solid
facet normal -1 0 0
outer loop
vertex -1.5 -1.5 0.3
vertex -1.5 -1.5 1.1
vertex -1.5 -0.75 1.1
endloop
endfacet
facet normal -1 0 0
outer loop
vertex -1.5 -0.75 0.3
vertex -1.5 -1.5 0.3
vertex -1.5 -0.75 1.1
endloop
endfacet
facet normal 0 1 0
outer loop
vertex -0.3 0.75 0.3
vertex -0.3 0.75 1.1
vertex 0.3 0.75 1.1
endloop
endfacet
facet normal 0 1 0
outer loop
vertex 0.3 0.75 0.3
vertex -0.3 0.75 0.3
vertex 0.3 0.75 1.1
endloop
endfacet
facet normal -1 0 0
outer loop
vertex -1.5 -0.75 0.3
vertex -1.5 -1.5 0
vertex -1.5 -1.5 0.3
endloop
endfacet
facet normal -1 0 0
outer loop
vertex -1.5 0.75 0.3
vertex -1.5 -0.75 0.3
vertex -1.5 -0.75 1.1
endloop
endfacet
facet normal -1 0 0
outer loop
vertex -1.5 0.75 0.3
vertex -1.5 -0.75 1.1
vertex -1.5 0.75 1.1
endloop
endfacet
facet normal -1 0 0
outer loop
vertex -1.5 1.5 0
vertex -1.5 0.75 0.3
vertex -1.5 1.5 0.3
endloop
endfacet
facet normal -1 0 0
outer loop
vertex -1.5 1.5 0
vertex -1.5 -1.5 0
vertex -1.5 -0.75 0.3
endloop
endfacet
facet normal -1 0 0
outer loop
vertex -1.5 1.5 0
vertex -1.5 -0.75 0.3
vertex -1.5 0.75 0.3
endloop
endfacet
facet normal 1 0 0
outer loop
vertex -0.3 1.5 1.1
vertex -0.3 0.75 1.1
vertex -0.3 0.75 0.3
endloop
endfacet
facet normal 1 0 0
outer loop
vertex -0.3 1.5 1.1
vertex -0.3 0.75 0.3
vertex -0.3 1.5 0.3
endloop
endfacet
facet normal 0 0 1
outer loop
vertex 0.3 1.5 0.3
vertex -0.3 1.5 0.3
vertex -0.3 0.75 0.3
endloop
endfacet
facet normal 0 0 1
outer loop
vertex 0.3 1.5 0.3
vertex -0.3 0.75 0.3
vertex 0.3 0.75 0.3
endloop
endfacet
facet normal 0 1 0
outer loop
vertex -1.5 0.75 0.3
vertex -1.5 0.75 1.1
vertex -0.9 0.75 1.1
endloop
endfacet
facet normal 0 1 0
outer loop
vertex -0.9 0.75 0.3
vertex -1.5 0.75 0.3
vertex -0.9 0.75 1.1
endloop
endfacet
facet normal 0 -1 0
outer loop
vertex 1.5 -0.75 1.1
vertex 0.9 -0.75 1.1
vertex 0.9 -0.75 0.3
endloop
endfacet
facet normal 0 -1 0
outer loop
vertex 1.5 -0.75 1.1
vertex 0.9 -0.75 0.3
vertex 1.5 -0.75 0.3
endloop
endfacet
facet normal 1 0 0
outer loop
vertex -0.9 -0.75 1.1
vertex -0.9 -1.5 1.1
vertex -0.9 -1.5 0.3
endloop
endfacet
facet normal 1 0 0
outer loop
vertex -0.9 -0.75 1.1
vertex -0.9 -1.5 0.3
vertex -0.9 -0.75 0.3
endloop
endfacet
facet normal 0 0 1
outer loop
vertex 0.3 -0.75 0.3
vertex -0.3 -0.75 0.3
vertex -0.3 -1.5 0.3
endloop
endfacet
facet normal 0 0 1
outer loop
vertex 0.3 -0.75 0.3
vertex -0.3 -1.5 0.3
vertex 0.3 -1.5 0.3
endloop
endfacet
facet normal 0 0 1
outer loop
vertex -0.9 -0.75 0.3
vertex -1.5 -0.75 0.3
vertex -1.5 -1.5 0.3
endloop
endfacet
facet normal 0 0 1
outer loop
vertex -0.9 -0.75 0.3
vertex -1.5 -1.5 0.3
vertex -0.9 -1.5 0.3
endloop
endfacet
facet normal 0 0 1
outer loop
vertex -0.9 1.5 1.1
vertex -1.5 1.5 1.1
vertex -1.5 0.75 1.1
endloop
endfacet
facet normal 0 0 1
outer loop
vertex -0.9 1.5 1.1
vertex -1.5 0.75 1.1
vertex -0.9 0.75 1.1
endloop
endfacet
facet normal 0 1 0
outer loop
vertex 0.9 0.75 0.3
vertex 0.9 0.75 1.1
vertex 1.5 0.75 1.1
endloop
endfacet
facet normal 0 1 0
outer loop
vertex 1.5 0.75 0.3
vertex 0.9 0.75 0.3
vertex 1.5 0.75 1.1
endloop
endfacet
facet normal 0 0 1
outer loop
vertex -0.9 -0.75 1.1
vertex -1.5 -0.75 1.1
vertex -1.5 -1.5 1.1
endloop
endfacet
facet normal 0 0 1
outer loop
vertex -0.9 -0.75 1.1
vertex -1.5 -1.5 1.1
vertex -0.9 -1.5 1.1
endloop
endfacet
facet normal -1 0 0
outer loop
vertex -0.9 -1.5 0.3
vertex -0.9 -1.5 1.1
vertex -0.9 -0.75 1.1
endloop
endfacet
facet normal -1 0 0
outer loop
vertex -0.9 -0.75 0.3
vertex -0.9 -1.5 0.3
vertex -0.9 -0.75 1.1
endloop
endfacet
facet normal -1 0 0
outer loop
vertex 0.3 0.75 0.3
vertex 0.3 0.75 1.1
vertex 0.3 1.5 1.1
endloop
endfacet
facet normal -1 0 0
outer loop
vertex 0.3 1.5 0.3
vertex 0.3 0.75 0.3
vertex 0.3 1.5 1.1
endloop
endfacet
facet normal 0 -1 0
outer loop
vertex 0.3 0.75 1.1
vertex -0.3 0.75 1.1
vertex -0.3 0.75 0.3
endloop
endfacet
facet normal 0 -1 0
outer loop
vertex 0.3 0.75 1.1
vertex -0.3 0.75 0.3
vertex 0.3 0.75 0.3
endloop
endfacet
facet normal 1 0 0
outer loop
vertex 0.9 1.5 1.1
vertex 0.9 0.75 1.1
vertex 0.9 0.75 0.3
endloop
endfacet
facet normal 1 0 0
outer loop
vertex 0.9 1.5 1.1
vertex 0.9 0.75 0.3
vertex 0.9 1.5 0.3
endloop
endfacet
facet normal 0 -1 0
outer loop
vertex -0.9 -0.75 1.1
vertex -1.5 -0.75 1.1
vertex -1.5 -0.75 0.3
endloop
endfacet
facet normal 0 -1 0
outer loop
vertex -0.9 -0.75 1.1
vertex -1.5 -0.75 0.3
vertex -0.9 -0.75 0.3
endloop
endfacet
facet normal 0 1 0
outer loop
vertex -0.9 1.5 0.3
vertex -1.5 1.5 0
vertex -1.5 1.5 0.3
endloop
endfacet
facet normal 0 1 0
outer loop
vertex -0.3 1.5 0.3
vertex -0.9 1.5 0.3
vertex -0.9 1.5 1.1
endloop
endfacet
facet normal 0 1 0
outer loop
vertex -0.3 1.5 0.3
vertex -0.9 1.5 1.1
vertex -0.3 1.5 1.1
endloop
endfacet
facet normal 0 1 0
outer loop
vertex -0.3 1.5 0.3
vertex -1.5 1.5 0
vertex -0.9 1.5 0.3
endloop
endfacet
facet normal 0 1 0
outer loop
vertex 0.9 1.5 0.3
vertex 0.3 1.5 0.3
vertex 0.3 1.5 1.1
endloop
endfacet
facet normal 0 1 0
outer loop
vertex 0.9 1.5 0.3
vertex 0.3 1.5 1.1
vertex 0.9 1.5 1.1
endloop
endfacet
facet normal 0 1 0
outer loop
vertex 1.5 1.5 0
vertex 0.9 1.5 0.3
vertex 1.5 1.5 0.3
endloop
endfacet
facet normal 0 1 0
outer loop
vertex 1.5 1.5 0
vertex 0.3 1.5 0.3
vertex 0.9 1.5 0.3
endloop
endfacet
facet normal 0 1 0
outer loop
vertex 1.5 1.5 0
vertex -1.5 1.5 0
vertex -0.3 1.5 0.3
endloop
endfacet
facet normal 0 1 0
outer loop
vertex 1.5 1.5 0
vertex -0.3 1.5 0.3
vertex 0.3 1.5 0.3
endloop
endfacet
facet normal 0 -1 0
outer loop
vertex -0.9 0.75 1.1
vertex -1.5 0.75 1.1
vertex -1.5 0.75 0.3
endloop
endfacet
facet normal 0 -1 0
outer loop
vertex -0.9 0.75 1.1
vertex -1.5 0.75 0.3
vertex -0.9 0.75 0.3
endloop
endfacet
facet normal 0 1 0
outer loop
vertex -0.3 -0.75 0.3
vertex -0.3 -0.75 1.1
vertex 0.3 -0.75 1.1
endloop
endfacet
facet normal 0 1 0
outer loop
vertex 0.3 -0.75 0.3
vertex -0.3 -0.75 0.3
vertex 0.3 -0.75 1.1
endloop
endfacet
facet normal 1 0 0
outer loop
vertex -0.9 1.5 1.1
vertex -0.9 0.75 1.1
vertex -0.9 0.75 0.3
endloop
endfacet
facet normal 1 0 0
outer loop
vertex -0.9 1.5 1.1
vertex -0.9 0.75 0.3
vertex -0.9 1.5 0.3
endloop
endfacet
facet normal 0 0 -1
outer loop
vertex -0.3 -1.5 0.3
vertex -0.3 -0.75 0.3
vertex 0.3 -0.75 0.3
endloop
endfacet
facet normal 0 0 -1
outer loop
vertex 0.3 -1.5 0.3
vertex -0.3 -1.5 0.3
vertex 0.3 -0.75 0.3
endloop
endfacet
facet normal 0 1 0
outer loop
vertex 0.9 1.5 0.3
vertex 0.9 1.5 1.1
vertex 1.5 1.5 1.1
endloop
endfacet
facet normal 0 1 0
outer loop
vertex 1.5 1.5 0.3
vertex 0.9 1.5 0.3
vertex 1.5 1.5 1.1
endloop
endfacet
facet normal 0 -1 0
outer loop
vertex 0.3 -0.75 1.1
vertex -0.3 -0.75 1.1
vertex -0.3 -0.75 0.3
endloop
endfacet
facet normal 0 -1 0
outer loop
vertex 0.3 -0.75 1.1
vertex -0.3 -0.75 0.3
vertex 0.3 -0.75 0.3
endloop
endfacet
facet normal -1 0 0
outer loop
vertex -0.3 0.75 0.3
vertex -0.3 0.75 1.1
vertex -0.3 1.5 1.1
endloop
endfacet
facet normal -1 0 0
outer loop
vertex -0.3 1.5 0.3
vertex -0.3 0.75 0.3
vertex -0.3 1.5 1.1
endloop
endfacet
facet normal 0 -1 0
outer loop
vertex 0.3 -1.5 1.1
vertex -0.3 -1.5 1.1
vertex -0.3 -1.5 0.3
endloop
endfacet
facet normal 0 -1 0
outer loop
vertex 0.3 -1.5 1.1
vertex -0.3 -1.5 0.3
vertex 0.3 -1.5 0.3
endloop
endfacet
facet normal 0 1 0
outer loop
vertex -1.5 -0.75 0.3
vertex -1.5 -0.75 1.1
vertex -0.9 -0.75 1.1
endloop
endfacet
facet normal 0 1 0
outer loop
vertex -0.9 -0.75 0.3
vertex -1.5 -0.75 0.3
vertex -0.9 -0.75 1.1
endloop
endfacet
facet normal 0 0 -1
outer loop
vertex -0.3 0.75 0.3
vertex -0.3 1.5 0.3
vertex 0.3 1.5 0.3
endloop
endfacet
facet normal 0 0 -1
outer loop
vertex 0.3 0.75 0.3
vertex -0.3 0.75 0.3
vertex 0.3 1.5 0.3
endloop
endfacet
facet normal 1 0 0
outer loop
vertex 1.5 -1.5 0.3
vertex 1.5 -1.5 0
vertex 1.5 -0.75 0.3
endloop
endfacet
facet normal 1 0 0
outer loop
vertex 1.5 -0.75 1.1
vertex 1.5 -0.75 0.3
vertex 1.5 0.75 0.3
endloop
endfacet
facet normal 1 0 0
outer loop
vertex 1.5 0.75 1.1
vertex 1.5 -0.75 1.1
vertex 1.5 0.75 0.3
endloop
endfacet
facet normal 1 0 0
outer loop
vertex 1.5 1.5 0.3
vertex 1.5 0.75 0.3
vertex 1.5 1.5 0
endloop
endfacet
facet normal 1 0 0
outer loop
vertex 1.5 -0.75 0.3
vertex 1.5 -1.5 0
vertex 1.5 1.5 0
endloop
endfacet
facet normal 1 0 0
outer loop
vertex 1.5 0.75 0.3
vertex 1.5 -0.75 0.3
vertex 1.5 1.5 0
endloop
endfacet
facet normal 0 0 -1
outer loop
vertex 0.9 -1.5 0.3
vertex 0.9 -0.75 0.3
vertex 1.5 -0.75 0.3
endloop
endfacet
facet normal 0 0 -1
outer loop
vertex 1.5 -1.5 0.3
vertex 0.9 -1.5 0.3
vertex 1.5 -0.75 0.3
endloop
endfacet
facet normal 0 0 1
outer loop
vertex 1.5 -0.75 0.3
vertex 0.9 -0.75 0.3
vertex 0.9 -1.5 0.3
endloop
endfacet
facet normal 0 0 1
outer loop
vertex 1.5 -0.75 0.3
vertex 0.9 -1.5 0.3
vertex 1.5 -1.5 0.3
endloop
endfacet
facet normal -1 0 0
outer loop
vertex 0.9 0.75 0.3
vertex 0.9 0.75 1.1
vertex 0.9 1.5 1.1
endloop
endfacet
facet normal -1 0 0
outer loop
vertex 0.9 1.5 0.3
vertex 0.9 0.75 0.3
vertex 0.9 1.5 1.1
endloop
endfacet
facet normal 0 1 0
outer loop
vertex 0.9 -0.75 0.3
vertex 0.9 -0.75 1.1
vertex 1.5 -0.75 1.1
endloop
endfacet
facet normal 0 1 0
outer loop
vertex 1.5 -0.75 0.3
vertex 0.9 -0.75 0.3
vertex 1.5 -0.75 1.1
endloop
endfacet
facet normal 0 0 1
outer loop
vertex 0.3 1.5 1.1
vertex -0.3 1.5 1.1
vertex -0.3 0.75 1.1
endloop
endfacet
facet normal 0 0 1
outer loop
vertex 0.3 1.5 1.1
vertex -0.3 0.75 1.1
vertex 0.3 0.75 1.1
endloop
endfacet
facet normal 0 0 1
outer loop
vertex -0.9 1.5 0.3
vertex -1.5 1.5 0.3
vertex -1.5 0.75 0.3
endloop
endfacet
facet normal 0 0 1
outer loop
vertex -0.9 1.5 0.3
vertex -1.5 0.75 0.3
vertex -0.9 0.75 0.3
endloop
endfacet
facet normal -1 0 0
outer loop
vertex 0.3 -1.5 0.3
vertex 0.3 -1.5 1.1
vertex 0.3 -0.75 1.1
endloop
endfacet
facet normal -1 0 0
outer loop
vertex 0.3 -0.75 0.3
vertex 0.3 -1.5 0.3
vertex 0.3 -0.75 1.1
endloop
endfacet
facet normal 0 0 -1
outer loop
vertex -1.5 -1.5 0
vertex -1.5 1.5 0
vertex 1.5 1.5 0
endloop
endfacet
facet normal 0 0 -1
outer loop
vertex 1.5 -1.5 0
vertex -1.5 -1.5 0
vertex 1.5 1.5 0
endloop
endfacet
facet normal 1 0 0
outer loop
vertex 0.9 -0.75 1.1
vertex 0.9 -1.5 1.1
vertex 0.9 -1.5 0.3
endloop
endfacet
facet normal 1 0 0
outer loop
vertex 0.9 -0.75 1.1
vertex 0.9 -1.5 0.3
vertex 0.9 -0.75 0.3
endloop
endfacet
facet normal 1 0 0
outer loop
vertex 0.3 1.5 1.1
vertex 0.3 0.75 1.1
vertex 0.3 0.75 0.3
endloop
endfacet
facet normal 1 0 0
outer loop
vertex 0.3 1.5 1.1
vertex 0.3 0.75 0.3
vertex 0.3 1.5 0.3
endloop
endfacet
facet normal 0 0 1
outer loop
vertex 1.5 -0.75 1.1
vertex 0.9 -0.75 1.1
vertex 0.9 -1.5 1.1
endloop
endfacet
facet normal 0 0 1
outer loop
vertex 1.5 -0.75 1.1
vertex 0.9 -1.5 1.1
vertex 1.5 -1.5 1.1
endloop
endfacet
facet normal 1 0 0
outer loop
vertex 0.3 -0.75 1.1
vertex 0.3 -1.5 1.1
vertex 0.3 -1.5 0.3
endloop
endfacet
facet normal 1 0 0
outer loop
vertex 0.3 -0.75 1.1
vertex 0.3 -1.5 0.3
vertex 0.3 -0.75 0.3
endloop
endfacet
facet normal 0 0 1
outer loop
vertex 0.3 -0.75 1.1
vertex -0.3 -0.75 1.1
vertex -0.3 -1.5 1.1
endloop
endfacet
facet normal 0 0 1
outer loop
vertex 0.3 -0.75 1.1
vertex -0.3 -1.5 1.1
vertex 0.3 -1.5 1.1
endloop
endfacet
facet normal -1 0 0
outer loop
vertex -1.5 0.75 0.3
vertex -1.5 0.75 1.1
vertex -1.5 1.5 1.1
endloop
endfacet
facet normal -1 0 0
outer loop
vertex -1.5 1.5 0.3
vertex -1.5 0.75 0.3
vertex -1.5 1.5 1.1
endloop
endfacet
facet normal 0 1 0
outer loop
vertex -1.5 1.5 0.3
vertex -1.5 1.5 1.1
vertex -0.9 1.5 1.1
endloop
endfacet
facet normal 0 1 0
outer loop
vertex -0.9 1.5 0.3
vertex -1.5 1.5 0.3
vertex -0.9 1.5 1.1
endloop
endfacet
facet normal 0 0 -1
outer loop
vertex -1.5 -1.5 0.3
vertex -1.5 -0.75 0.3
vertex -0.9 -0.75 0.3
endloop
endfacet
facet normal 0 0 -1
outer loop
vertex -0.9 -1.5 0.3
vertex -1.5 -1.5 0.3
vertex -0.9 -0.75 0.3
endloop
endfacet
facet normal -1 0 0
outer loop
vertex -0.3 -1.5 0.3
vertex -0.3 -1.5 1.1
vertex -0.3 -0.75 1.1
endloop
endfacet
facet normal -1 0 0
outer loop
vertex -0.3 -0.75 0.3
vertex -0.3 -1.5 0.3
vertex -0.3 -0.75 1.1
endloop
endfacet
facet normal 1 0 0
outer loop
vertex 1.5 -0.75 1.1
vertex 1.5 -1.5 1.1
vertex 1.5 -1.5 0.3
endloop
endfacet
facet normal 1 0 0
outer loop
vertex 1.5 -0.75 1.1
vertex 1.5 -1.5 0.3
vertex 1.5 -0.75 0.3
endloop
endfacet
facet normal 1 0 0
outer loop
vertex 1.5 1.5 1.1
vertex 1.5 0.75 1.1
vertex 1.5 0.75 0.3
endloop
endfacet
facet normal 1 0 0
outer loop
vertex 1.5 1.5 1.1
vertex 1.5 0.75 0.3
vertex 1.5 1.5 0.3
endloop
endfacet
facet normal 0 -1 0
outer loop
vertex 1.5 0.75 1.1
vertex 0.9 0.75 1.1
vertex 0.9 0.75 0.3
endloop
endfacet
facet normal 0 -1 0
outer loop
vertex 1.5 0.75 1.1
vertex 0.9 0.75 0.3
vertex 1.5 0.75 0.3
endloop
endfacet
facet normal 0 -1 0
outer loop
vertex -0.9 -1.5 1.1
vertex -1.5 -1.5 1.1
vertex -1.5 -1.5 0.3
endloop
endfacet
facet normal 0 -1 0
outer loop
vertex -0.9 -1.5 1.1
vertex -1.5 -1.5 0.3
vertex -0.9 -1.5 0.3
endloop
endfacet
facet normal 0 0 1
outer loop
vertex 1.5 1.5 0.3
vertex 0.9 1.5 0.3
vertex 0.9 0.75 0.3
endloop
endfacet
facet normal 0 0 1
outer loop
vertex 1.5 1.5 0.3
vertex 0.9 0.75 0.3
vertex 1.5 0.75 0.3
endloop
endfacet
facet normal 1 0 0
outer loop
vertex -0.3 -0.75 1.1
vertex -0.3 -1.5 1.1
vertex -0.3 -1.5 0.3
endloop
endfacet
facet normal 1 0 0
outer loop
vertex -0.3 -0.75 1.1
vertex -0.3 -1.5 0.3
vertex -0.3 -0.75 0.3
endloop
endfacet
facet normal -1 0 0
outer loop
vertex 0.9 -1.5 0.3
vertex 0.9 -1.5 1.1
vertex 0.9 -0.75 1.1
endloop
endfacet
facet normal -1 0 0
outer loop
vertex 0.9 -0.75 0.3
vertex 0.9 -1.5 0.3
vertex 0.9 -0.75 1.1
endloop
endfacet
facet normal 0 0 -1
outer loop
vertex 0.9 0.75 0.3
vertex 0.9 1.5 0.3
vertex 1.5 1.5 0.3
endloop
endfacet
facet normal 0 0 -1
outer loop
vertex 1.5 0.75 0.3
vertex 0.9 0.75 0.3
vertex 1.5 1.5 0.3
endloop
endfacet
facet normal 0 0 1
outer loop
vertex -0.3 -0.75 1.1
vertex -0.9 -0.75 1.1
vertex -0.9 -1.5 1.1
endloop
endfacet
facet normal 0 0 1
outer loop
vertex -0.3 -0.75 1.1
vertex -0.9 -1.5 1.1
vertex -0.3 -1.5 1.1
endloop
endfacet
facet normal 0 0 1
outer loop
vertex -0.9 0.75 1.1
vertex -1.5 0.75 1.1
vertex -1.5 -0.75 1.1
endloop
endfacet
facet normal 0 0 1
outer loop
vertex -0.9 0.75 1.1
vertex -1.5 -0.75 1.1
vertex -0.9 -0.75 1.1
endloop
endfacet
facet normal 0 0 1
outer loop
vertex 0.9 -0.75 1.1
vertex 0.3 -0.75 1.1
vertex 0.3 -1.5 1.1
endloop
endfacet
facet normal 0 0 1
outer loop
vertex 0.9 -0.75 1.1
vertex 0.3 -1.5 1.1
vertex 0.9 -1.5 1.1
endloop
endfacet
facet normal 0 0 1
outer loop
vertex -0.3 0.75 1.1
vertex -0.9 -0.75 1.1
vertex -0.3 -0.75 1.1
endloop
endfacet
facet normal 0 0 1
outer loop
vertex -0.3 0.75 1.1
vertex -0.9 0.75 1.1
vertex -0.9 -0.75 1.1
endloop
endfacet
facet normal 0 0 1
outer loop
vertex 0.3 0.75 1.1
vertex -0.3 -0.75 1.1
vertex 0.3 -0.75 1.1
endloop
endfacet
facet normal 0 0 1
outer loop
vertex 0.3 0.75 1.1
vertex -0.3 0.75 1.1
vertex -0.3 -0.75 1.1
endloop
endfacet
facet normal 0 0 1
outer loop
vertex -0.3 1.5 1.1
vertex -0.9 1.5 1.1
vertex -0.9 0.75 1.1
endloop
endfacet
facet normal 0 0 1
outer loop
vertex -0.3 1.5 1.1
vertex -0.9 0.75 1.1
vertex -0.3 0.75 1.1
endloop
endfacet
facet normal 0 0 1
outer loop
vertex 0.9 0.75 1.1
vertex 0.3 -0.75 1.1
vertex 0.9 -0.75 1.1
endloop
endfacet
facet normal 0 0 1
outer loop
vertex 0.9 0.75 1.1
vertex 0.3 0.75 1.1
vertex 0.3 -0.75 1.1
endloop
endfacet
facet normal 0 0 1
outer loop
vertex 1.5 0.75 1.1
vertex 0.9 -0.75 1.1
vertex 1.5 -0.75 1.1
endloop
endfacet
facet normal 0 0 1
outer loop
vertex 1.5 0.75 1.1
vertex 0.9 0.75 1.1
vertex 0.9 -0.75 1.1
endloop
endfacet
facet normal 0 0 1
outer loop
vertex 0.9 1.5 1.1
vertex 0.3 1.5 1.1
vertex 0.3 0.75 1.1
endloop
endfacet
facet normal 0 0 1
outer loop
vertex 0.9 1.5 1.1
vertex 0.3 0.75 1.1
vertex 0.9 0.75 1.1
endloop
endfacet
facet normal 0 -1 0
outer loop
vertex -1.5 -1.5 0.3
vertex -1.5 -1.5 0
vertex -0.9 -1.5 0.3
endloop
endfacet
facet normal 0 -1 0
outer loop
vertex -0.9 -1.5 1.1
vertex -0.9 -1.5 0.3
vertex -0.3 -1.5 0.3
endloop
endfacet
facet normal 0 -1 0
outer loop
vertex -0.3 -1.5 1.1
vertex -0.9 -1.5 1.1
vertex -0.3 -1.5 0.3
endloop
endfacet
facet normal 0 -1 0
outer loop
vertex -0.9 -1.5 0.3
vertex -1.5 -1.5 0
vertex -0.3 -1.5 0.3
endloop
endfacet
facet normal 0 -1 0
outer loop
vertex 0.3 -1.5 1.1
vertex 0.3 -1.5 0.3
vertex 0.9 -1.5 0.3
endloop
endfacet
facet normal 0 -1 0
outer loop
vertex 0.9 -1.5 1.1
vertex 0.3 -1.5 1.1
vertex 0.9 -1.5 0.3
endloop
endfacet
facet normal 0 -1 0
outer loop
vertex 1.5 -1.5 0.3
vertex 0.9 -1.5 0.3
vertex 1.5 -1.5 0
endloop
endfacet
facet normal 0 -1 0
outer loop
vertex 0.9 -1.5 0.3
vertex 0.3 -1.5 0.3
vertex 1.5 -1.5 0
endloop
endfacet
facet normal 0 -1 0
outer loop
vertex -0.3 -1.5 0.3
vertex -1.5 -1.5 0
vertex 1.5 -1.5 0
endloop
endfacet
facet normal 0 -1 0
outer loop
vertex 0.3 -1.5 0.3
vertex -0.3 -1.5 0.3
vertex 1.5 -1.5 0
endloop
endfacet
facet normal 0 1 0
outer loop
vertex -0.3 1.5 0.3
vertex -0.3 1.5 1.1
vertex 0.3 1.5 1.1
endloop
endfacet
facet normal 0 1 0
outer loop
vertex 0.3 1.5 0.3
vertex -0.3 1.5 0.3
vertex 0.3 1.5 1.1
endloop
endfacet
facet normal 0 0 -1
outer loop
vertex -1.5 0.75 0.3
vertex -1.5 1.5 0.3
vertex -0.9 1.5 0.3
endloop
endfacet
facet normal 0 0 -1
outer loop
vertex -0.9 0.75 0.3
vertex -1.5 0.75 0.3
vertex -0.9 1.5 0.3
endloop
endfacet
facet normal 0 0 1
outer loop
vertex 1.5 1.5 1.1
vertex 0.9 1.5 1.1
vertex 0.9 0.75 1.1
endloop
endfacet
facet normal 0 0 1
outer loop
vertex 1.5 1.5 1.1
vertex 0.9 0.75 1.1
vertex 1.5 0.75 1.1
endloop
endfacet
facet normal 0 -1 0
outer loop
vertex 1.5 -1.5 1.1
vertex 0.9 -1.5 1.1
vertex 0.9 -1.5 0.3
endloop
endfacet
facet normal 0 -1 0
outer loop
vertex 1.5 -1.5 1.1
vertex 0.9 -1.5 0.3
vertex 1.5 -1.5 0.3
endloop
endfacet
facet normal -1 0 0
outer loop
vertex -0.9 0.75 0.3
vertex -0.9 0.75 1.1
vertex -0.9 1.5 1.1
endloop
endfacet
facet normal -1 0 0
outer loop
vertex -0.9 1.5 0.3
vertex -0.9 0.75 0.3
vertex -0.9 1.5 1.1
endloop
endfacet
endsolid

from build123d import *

# Parameters (mm, degrees)
SKETCH1_W           = 3
SKETCH1_H           = 3
BOSS_EXTRUDE1_DEPTH = 1.1
SKETCH2_W           = 0.6
SKETCH2_H           = 0.75
CUT_EXTRUDE1_DEPTH  = 0.8
BOSS_EXTRUDE3_REACH = 4.39
SKETCH2_5_W         = 0.6
SKETCH2_5_H         = 0.75


with BuildPart() as part:
    # Sketch1 → Boss-Extrude1 (new body)
    with BuildSketch(Plane.XY):
        Rectangle(SKETCH1_W, SKETCH1_H)
    extrude(amount=BOSS_EXTRUDE1_DEPTH)

    # Sketch2 → Cut-Extrude1 (cut)
    with BuildSketch(Plane.XY.offset(1.1)):
        with Locations((0, 1.125)):
            Rectangle(SKETCH2_W, SKETCH2_H)
        with Locations((1.2, 1.125)):
            Rectangle(SKETCH2_W, SKETCH2_H)
        with Locations((1.2, -1.125)):
            Rectangle(SKETCH2_W, SKETCH2_H)
        with Locations((-1.2, -1.125)):
            Rectangle(SKETCH2_W, SKETCH2_H)
        with Locations((0, -1.125)):
            Rectangle(SKETCH2_W, SKETCH2_H)
        with Locations((-1.2, 1.125)):
            Rectangle(SKETCH2_W, SKETCH2_H)
    extrude(amount=-CUT_EXTRUDE1_DEPTH, mode=Mode.SUBTRACT)


with BuildPart() as body_2:

    # Sketch2<5> → Boss-Extrude3 (new, up to next)
    with BuildSketch(Plane.XY.offset(1.1), mode=Mode.PRIVATE) as boss_extrude3_sk1:
        with Locations((0, 1.125)):
            Rectangle(SKETCH2_5_W, SKETCH2_5_H)
    boss_extrude3_tool1 = extrude(boss_extrude3_sk1.sketch, amount=-BOSS_EXTRUDE3_REACH, mode=Mode.PRIVATE) - part.part
    # Sketch2<5> → Boss-Extrude3 (new, up to next)
    with BuildSketch(Plane.XY.offset(1.1), mode=Mode.PRIVATE) as boss_extrude3_sk2:
        with Locations((1.2, 1.125)):
            Rectangle(SKETCH2_5_W, SKETCH2_5_H)
    boss_extrude3_tool2 = extrude(boss_extrude3_sk2.sketch, amount=-BOSS_EXTRUDE3_REACH, mode=Mode.PRIVATE) - part.part
    # Sketch2<5> → Boss-Extrude3 (new, up to next)
    with BuildSketch(Plane.XY.offset(1.1), mode=Mode.PRIVATE) as boss_extrude3_sk3:
        with Locations((1.2, -1.125)):
            Rectangle(SKETCH2_5_W, SKETCH2_5_H)
    boss_extrude3_tool3 = extrude(boss_extrude3_sk3.sketch, amount=-BOSS_EXTRUDE3_REACH, mode=Mode.PRIVATE) - part.part
    # Sketch2<5> → Boss-Extrude3 (new, up to next)
    with BuildSketch(Plane.XY.offset(1.1), mode=Mode.PRIVATE) as boss_extrude3_sk4:
        with Locations((-1.2, -1.125)):
            Rectangle(SKETCH2_5_W, SKETCH2_5_H)
    boss_extrude3_tool4 = extrude(boss_extrude3_sk4.sketch, amount=-BOSS_EXTRUDE3_REACH, mode=Mode.PRIVATE) - part.part
    # Sketch2<5> → Boss-Extrude3 (new, up to next)
    with BuildSketch(Plane.XY.offset(1.1), mode=Mode.PRIVATE) as boss_extrude3_sk5:
        with Locations((0, -1.125)):
            Rectangle(SKETCH2_5_W, SKETCH2_5_H)
    boss_extrude3_tool5 = extrude(boss_extrude3_sk5.sketch, amount=-BOSS_EXTRUDE3_REACH, mode=Mode.PRIVATE) - part.part
    # Sketch2<5> → Boss-Extrude3 (new, up to next)
    with BuildSketch(Plane.XY.offset(1.1), mode=Mode.PRIVATE) as boss_extrude3_sk6:
        with Locations((-1.2, 1.125)):
            Rectangle(SKETCH2_5_W, SKETCH2_5_H)
    boss_extrude3_tool6 = extrude(boss_extrude3_sk6.sketch, amount=-BOSS_EXTRUDE3_REACH, mode=Mode.PRIVATE) - part.part
    add(boss_extrude3_tool1.solids().sort_by_distance((0, 1.125, 1.1))[0])
    add(boss_extrude3_tool2.solids().sort_by_distance((1.2, 1.125, 1.1))[0])
    add(boss_extrude3_tool3.solids().sort_by_distance((1.2, -1.125, 1.1))[0])
    add(boss_extrude3_tool4.solids().sort_by_distance((-1.2, -1.125, 1.1))[0])
    add(boss_extrude3_tool5.solids().sort_by_distance((0, -1.125, 1.1))[0])
    add(boss_extrude3_tool6.solids().sort_by_distance((-1.2, 1.125, 1.1))[0])


solid = Compound([part.part, body_2.part])
